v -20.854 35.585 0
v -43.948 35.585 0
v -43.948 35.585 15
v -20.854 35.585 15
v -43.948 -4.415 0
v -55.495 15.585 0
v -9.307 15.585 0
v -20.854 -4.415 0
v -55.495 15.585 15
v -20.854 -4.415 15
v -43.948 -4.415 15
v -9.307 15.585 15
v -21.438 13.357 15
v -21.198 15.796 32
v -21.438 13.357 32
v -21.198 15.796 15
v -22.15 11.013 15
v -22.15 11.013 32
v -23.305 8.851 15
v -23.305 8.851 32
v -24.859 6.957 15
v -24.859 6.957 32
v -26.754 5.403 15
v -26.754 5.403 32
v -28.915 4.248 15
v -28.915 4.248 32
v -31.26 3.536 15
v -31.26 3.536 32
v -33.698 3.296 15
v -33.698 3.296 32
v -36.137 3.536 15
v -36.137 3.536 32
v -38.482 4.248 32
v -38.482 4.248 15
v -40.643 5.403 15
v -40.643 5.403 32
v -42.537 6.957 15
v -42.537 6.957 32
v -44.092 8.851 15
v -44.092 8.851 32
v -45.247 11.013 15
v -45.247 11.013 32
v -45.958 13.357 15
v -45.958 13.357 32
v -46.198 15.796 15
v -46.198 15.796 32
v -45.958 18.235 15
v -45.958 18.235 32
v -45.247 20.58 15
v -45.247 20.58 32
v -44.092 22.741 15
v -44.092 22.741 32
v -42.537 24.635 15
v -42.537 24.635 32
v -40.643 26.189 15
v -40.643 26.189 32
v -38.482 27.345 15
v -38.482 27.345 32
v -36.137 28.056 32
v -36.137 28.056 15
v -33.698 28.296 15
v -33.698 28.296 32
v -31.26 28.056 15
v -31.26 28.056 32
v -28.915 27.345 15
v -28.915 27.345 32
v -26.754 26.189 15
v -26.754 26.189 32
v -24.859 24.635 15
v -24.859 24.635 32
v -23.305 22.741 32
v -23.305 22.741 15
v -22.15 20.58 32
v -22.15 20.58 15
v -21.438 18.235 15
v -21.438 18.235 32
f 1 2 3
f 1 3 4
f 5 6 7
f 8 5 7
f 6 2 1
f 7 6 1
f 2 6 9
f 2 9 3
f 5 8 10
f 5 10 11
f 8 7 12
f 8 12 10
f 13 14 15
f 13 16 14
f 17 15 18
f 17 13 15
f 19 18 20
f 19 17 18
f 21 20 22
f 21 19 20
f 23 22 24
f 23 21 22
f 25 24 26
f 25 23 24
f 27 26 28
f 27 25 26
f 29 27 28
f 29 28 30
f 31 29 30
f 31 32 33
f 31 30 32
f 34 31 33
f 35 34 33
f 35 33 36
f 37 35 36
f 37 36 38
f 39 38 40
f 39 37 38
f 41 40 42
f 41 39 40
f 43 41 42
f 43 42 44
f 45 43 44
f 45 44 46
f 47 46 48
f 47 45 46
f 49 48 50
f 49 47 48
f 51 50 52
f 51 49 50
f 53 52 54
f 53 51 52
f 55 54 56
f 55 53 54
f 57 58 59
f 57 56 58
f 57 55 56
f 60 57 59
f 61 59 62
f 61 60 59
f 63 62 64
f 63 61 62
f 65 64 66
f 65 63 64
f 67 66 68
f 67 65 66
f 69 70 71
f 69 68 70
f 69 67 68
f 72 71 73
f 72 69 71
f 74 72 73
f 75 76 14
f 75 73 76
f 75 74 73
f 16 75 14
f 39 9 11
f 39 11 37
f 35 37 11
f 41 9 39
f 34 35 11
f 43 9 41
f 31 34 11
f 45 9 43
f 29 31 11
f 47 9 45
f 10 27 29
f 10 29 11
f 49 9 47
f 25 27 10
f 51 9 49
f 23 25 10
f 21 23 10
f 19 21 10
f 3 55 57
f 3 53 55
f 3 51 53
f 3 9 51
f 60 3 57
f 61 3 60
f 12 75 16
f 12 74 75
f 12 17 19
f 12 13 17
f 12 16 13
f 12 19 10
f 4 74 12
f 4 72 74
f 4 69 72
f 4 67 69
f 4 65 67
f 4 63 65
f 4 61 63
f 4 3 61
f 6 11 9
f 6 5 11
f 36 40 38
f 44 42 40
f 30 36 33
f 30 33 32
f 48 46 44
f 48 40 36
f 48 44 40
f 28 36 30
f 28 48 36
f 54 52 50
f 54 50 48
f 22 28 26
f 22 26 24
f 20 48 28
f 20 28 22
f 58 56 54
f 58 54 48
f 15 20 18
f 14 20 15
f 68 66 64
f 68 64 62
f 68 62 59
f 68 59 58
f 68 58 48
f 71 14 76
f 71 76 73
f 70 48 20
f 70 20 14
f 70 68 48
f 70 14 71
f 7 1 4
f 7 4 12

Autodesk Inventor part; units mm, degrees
ref_plane "YZ Plane" through (0, 0, 0) normal (1, 0, 0) x (0, 1, 0)
ref_plane "XZ Plane" through (0, 0, 0) normal (0, 1, 0) x (-1, 0, 0)
ref_plane "XY Plane" through (0, 0, 0) normal (0, 0, 1) x (1, 0, 0)
sketch "Sketch1" plane through (0, 0, 0) normal (0, 0, 1) x (1, 0, 0)
  line L0 (-9.3066, 15.5847) -> (-20.8536, -4.4153)
  line L1 (-20.8536, -4.4153) -> (-43.9476, -4.4153)
  line L2 (-43.9476, -4.4153) -> (-55.4946, 15.5847)
  line L3 (-55.4946, 15.5847) -> (-43.9476, 35.5847)
  line L4 (-43.9476, 35.5847) -> (-20.8536, 35.5847)
  line L5 (-20.8536, 35.5847) -> (-9.3066, 15.5847)
  point P0 (0, 0)
  point P1 (-32.4006, 15.5847)
  dimension "d0" = 20
extrude "Extrusion1" add sketch "Sketch1" along normal blind 15
sketch "Sketch2" plane through (0, 0, 15) normal (0, 0, 1) x (1, 0, 0)
  circle A0 centre (-33.6983, 15.7961) radius 12.5
  point P0 (0, 0)
  dimension "d3" = 25
extrude "Extrusion2" add sketch "Sketch2" along normal blind 17
thread "Thread1" size "M25x2" class "6g" standard "ANSI Metric M Profile" full length
properties part number "db screw 1"
